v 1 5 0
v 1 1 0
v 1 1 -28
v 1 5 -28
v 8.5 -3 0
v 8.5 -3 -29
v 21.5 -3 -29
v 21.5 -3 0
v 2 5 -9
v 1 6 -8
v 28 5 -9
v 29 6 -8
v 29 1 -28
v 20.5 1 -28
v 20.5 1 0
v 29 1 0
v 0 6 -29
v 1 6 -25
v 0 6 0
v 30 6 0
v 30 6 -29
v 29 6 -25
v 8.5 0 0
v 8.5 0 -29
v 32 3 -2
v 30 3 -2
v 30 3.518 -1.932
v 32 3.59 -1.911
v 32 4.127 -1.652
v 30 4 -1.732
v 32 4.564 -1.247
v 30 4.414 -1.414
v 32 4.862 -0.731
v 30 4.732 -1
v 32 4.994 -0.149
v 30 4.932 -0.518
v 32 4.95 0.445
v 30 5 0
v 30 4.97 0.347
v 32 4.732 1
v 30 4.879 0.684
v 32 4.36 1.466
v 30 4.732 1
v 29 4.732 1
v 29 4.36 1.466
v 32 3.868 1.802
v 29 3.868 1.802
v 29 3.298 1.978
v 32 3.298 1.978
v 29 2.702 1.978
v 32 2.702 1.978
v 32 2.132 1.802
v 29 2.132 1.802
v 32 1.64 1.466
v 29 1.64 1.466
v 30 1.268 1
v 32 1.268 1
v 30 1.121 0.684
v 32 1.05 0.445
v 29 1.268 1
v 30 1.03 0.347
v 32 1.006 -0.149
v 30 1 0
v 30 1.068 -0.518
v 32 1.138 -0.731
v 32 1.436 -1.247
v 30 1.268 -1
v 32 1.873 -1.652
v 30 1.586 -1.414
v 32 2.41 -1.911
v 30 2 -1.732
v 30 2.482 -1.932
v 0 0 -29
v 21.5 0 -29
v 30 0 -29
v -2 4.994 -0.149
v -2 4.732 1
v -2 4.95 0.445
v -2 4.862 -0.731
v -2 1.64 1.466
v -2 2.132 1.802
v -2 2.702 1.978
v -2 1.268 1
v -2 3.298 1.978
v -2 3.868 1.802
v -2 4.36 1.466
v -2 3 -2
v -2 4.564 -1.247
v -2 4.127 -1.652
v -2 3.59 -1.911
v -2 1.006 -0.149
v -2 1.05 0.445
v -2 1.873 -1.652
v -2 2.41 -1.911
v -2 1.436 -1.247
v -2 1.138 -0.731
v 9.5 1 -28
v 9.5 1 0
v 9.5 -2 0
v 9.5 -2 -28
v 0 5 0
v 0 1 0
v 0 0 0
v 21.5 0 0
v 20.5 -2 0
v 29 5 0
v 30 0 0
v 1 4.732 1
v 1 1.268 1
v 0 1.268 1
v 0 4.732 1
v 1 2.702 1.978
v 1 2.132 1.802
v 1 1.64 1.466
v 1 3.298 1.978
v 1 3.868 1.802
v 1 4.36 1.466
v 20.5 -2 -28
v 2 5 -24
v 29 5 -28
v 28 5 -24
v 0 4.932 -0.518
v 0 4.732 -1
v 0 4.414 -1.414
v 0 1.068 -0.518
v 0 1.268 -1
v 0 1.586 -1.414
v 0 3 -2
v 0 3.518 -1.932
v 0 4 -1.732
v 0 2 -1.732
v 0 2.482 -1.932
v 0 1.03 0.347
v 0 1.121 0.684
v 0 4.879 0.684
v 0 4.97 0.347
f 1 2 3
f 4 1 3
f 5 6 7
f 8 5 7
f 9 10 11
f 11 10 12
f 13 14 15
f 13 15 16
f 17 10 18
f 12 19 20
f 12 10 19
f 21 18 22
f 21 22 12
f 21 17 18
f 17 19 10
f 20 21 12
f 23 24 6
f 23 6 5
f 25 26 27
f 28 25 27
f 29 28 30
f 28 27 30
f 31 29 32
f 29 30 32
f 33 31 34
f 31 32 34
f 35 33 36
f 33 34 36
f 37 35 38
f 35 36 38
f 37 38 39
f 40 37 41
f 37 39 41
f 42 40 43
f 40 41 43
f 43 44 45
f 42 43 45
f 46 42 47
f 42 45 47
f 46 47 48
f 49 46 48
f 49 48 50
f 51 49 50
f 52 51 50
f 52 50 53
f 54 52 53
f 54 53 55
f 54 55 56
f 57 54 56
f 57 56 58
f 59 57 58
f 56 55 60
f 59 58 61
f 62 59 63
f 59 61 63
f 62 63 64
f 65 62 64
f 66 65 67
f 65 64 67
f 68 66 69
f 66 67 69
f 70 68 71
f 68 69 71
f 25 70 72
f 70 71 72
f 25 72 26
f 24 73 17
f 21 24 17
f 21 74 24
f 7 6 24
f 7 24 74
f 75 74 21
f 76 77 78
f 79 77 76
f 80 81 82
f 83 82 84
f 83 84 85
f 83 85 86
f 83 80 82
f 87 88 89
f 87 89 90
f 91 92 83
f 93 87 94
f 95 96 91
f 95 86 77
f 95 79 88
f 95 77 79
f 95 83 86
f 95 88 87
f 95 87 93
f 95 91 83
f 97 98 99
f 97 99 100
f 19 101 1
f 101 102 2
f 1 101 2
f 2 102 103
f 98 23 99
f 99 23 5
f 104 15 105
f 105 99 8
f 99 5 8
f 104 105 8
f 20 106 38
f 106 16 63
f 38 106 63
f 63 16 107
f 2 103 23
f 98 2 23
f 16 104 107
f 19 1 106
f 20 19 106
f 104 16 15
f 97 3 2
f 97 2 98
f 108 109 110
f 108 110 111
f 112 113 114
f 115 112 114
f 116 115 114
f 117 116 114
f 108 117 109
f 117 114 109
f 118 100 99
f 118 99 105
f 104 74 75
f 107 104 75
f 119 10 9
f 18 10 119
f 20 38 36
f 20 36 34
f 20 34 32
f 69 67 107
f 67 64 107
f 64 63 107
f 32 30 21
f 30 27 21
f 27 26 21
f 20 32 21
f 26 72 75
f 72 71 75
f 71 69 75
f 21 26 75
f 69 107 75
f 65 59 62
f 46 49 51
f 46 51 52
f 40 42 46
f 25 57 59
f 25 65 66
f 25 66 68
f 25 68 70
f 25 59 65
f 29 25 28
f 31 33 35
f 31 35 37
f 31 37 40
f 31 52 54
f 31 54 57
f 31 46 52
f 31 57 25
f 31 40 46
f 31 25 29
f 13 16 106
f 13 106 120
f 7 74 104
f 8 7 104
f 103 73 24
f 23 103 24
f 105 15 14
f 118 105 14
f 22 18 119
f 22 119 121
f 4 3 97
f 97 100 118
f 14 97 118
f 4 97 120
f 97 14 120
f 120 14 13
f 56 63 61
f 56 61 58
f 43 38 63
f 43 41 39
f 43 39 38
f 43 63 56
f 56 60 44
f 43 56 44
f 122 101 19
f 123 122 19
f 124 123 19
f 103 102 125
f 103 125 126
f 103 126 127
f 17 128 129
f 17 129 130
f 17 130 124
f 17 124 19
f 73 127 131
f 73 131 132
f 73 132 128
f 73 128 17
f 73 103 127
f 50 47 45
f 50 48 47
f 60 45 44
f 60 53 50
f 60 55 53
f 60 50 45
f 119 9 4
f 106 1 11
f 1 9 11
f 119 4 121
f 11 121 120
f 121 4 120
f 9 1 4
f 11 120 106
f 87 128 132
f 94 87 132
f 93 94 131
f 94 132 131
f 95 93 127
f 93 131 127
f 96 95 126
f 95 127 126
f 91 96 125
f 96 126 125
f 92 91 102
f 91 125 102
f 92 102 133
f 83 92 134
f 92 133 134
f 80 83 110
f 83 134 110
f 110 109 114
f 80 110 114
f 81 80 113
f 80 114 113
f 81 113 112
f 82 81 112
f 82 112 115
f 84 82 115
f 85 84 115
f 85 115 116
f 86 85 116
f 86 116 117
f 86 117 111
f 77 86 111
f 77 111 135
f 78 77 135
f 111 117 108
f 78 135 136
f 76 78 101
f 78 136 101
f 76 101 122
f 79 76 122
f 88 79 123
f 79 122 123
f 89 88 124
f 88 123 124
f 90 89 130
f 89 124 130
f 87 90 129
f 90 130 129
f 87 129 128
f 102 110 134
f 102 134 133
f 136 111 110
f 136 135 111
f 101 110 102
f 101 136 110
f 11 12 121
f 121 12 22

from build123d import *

# Parameters (mm, degrees)
ESQUISSE1_W             = 30
ESQUISSE1_H             = 29
BOSS_EXTRU_1_DEPTH      = 6
COQUE1_T                = -1
ENL_V_MAT_EXTRU_1_REACH = 44.154
ESQUISSE2_W             = 26
ESQUISSE2_H             = 15
ESQUISSE3_W             = 13
ESQUISSE3_H             = 29
BOSS_EXTRU_2_DEPTH      = 3
ESQUISSE5_W             = 11
ESQUISSE5_H             = 28
ENL_V_MAT_EXTRU_2_DEPTH = 3
BOSS_EXTRU_3_DEPTH      = 2
BOSS_EXTRU_3_DEPTH_BACK = 1
ESQUISSE6_R             = 2
BOSS_EXTRU_4_DEPTH      = 2
BOSS_EXTRU_4_DEPTH_BACK = 1
ESQUISSE7_R             = 2
CHANFREIN1_SIZE         = 1
ESQUISSE11_W            = 1
ESQUISSE11_H            = 5.866928615
ENL_V_MAT_EXTRU_5_DEPTH = 1
ESQUISSE12_W            = 1
ESQUISSE12_H            = 9.243044447
ENL_V_MAT_EXTRU_6_DEPTH = 1


with BuildPart() as part:
    # Esquisse1 → Boss.-Extru.1 (new body)
    with BuildSketch(Plane(origin=(0, 0, 0), x_dir=(1, 0, 0), z_dir=(0, 1, 0))):
        with Locations((15, 14.5)):
            Rectangle(ESQUISSE1_W, ESQUISSE1_H)
    extrude(amount=BOSS_EXTRU_1_DEPTH)

    # Coque1
    coque1_openings = [part.faces().sort_by_distance(p)[0] for p in [
        (15, 3, 0),
    ]]
    offset(amount=COQUE1_T, openings=coque1_openings, kind=Kind.INTERSECTION)

    # Esquisse2 → Enlèv. mat.-Extru.1 (cut, up to next)
    with BuildSketch(Plane(origin=(0, 6, 0), x_dir=(1, 0, 0), z_dir=(0, 1, 0)), mode=Mode.PRIVATE) as enl_v_mat_extru_1_sk1:
        with Locations((15, 16.5)):
            Rectangle(ESQUISSE2_W, ESQUISSE2_H)
    enl_v_mat_extru_1_tool1 = extrude(enl_v_mat_extru_1_sk1.sketch, amount=-ENL_V_MAT_EXTRU_1_REACH, mode=Mode.PRIVATE) & part.part
    add(enl_v_mat_extru_1_tool1.solids().sort_by_distance((15, 6, -16.5))[0], mode=Mode.SUBTRACT)

    # Esquisse3 → Boss.-Extru.2 (add)
    with BuildSketch(Plane.XZ):
        with Locations((15, -14.5)):
            Rectangle(ESQUISSE3_W, ESQUISSE3_H)
    extrude(amount=BOSS_EXTRU_2_DEPTH)

    # Esquisse5 → Enlèv. mat.-Extru.2 (cut)
    with BuildSketch(Plane(origin=(0, 1, 0), x_dir=(1, 0, 0), z_dir=(0, 1, 0))):
        with Locations((15, 14)):
            Rectangle(ESQUISSE5_W, ESQUISSE5_H)
    extrude(amount=-ENL_V_MAT_EXTRU_2_DEPTH, mode=Mode.SUBTRACT)

    # Esquisse6 → Boss.-Extru.3 (add, two sides: drawn at the far end of the back side and taken through both)
    with BuildSketch(Plane(origin=(30, 0, 0), x_dir=(0, 0, -1), z_dir=(1, 0, 0)).offset(-BOSS_EXTRU_3_DEPTH_BACK)):
        with Locations((0, 3)):
            Circle(ESQUISSE6_R)
    extrude(amount=BOSS_EXTRU_3_DEPTH + BOSS_EXTRU_3_DEPTH_BACK)

    # Esquisse7 → Boss.-Extru.4 (add, two sides: drawn at the far end of the back side and taken through both)
    with BuildSketch(Plane.ZY.offset(-BOSS_EXTRU_4_DEPTH_BACK)):
        with Locations(Location((0, 3, 0), (0, 0, 180))):
            Circle(ESQUISSE7_R)
    extrude(amount=BOSS_EXTRU_4_DEPTH + BOSS_EXTRU_4_DEPTH_BACK)

    # Chanfrein1
    chanfrein1_edges = [part.edges().sort_by_distance(p)[0] for p in [
        (15, 6, -24),
        (28, 6, -16.5),
        (15, 6, -9),
        (2, 6, -16.5),
    ]]
    chamfer(chanfrein1_edges, length=CHANFREIN1_SIZE - 0.0001)  # a hair under: the kernel refuses the full size

    # Esquisse11 → Enlèv. mat.-Extru.5 (cut)
    with BuildSketch(Plane.ZY.offset(-29)):
        with Locations((0.5, 3.436697282)):
            Rectangle(ESQUISSE11_W, ESQUISSE11_H)
    extrude(amount=-ENL_V_MAT_EXTRU_5_DEPTH, mode=Mode.SUBTRACT)

    # Esquisse12 → Enlèv. mat.-Extru.6 (cut)
    with BuildSketch(Plane(origin=(1, 0, 0), x_dir=(0, 0, -1), z_dir=(1, 0, 0))):
        with Locations((-0.5, 2.795315934)):
            Rectangle(ESQUISSE12_W, ESQUISSE12_H)
    extrude(amount=-ENL_V_MAT_EXTRU_6_DEPTH, mode=Mode.SUBTRACT)


solid = part.part
